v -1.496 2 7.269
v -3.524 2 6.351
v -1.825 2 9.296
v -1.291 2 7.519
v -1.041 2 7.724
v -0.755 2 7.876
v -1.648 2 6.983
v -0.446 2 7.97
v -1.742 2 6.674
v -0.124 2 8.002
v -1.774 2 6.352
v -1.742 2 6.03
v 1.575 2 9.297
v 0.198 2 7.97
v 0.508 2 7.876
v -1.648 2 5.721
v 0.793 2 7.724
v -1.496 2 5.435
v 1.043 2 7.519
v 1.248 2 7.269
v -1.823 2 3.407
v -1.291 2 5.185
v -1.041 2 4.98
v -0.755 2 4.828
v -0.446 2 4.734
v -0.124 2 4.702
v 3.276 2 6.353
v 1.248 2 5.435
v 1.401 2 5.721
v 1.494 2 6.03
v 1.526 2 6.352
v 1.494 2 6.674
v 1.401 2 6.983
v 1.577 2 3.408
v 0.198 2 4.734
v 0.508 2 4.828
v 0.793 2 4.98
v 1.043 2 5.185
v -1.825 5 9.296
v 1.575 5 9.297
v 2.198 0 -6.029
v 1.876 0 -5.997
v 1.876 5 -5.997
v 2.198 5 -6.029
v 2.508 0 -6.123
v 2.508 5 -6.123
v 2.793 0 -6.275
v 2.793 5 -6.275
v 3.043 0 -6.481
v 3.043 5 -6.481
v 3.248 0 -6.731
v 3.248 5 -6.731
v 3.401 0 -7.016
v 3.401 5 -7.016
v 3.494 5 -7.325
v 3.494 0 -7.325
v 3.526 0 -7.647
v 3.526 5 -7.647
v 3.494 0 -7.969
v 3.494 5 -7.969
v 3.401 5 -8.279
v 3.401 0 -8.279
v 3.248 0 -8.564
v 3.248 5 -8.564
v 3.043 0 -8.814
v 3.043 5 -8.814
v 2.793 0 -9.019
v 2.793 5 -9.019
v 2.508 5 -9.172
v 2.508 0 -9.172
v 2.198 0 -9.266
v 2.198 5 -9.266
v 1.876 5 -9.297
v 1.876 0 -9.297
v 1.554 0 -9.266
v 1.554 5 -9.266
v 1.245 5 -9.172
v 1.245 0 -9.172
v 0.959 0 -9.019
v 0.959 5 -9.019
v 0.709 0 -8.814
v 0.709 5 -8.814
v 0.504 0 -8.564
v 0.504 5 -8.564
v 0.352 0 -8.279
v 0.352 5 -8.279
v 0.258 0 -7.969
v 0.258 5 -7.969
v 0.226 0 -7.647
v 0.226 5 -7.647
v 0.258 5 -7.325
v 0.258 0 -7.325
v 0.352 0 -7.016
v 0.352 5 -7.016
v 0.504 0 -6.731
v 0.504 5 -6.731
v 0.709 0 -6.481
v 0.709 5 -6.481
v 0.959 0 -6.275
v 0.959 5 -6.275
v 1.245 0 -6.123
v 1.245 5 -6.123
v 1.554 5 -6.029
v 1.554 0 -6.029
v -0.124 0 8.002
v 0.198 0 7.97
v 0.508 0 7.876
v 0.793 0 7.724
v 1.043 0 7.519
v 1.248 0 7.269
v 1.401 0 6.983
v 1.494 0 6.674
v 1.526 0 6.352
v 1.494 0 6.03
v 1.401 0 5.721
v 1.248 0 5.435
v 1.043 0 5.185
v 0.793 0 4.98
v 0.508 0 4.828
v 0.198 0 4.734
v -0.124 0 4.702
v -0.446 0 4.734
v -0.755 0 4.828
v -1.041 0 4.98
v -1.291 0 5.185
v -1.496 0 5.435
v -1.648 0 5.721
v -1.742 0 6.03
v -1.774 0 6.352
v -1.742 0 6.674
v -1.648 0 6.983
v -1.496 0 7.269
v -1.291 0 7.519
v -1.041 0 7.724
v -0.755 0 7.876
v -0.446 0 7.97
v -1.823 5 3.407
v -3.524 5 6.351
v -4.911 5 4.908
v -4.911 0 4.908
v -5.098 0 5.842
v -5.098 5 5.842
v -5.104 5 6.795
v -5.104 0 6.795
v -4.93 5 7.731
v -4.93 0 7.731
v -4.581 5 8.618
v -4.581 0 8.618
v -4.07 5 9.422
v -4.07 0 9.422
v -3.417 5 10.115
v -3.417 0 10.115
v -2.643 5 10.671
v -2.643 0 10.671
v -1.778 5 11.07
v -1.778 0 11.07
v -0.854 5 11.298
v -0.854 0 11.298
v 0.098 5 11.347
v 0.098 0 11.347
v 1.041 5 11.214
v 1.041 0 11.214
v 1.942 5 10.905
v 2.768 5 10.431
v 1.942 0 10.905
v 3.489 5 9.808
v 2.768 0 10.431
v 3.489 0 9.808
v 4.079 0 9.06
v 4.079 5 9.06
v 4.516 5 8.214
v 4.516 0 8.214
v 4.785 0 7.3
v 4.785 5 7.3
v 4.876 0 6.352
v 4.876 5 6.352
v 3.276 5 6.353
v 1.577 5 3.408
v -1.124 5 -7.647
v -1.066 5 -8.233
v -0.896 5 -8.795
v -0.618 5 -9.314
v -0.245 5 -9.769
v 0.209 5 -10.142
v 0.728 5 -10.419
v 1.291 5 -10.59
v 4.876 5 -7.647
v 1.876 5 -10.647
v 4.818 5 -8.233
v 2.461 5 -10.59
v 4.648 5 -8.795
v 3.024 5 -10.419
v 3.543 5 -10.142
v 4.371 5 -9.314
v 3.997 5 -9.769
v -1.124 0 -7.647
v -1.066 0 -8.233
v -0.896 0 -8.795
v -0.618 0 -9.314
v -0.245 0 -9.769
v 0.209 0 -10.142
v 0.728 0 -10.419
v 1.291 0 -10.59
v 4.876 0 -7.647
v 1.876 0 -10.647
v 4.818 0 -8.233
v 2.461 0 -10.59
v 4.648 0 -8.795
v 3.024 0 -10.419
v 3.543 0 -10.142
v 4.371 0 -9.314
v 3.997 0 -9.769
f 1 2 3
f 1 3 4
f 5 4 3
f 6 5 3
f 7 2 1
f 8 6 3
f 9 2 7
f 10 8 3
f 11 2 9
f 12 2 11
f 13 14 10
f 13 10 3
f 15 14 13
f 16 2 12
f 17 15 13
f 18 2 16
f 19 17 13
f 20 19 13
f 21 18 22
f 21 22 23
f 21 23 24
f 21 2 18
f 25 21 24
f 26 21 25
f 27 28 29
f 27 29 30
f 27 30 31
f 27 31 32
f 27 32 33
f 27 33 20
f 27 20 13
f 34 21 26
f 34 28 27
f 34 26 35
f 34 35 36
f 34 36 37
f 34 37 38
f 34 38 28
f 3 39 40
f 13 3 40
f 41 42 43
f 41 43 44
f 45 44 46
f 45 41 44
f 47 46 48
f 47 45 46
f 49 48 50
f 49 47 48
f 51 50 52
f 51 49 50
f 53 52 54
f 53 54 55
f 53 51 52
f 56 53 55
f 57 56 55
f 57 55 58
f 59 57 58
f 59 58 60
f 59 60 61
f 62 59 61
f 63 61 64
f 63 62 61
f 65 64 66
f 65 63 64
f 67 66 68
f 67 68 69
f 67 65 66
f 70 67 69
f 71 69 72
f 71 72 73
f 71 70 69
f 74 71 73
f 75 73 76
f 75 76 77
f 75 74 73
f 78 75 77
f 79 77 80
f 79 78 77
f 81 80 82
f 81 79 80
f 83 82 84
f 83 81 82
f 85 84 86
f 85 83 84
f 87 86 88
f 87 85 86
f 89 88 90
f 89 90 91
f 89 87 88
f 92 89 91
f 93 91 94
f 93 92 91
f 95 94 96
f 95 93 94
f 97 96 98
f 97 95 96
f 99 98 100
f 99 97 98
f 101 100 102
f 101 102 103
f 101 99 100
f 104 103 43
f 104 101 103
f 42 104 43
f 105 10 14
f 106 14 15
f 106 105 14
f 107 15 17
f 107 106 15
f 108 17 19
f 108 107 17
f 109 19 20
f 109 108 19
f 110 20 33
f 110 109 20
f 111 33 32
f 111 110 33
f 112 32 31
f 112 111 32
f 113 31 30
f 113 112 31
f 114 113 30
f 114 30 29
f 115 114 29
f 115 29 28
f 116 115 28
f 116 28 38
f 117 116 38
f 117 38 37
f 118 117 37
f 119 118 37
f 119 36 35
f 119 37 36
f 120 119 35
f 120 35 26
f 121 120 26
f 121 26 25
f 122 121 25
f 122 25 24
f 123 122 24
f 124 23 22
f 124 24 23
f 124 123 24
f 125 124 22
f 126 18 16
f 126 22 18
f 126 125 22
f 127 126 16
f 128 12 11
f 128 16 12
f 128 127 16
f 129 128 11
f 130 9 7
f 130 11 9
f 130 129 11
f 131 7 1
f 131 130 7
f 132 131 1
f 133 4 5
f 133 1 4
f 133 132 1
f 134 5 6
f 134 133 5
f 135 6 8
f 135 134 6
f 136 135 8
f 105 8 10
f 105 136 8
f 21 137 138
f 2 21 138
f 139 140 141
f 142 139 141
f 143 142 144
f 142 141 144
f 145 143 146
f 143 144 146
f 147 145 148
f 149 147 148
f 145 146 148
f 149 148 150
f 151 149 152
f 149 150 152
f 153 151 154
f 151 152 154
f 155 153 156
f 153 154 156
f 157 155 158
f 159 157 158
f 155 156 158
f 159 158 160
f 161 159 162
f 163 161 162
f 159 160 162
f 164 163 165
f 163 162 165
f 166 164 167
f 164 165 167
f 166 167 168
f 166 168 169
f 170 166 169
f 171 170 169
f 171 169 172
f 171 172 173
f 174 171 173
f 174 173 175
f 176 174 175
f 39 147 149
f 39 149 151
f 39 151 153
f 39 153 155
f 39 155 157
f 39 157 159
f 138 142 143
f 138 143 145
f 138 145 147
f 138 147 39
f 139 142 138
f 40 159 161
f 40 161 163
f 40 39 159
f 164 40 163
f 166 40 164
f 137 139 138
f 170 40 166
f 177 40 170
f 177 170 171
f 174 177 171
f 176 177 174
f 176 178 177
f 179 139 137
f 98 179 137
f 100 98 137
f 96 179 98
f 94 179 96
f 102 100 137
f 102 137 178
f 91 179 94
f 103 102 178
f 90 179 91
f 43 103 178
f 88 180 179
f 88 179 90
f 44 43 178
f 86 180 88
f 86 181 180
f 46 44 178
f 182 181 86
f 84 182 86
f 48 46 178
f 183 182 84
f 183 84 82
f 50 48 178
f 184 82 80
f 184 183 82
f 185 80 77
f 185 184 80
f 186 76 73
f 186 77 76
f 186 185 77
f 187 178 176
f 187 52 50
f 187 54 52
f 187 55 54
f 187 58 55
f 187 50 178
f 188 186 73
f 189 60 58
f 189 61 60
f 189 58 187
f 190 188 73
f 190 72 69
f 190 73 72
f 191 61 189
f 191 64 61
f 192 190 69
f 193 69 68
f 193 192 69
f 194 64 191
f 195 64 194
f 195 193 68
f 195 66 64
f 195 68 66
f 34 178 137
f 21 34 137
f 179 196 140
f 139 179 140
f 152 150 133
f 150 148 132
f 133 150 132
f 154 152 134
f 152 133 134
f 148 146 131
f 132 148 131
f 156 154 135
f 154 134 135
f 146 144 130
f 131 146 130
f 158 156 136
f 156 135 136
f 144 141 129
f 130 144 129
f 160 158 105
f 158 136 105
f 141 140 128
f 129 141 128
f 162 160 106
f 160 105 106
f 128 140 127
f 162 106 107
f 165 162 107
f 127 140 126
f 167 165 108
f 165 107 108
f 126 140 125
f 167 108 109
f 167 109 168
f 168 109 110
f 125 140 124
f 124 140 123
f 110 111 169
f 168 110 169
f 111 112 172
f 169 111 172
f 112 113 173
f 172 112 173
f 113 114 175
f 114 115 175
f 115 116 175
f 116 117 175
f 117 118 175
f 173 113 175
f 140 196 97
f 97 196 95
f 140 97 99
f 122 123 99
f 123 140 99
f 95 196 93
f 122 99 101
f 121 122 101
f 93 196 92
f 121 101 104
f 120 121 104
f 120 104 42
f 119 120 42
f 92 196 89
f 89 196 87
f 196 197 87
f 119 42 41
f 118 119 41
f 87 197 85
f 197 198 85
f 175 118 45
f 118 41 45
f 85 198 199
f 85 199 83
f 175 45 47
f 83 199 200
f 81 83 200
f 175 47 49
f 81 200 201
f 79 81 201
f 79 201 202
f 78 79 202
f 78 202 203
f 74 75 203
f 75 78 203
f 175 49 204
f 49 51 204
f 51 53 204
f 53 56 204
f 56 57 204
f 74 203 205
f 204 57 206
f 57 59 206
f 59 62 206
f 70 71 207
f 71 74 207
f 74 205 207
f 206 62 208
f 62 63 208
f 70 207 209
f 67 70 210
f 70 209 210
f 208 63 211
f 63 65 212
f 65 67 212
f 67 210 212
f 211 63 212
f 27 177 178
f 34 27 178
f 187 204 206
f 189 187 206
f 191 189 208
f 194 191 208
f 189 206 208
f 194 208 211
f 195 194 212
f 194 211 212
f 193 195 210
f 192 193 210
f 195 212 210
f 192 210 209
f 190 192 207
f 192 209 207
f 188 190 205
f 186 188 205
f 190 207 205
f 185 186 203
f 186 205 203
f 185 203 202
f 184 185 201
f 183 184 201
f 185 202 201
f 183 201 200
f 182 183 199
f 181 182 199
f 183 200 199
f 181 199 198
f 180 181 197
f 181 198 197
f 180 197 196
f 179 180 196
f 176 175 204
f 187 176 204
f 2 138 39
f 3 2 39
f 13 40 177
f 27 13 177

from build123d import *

# Parameters (mm, degrees)
SKETCH1_R           = 1.65
BOSS_EXTRUDE1_DEPTH = 5
CUT_EXTRUDE1_DEPTH  = 3


with BuildPart() as part:
    # Sketch1 → Boss-Extrude1 (new body)
    with BuildSketch(Plane(origin=(0, 0, 0), x_dir=(1, 0, 0), z_dir=(0, 1, 0))):
        with BuildLine():
            Line((-1.123874335, 7.64724342), (-4.910860932, -4.908083254))
            ThreePointArc((-4.910860932, -4.908083254), (-0.85362327, -11.298412816), (4.876125665, -6.35195282))
            Line((4.876125665, -6.35195282), (4.876125665, 7.64724342))
            ThreePointArc((4.876125665, 7.64724342), (1.876125665, 10.64724342), (-1.123874335, 7.64724342))
        make_face()
        with Locations(Location((1.876125665, 7.64724342, 0), (0, 0, 270))):
            Circle(SKETCH1_R, mode=Mode.SUBTRACT)
        with Locations(Location((-0.123874335, -6.35195282, 0), (0, 0, 270))):
            Circle(SKETCH1_R, mode=Mode.SUBTRACT)
    extrude(amount=BOSS_EXTRUDE1_DEPTH)

    # Sketch2 → Cut-Extrude1 (cut)
    with BuildSketch(Plane(origin=(0, 5, 0), x_dir=(1, 0, 0), z_dir=(0, 1, 0))):
        Polygon((3.276125665, -6.352756866), (1.576821989, -3.40786847), (-1.823178011, -3.407064424), (-3.523874335, -6.351148774), (-1.82457066, -9.29603717), (1.57542934, -9.296841216), align=None)
    extrude(amount=-CUT_EXTRUDE1_DEPTH, mode=Mode.SUBTRACT)


solid = part.part
